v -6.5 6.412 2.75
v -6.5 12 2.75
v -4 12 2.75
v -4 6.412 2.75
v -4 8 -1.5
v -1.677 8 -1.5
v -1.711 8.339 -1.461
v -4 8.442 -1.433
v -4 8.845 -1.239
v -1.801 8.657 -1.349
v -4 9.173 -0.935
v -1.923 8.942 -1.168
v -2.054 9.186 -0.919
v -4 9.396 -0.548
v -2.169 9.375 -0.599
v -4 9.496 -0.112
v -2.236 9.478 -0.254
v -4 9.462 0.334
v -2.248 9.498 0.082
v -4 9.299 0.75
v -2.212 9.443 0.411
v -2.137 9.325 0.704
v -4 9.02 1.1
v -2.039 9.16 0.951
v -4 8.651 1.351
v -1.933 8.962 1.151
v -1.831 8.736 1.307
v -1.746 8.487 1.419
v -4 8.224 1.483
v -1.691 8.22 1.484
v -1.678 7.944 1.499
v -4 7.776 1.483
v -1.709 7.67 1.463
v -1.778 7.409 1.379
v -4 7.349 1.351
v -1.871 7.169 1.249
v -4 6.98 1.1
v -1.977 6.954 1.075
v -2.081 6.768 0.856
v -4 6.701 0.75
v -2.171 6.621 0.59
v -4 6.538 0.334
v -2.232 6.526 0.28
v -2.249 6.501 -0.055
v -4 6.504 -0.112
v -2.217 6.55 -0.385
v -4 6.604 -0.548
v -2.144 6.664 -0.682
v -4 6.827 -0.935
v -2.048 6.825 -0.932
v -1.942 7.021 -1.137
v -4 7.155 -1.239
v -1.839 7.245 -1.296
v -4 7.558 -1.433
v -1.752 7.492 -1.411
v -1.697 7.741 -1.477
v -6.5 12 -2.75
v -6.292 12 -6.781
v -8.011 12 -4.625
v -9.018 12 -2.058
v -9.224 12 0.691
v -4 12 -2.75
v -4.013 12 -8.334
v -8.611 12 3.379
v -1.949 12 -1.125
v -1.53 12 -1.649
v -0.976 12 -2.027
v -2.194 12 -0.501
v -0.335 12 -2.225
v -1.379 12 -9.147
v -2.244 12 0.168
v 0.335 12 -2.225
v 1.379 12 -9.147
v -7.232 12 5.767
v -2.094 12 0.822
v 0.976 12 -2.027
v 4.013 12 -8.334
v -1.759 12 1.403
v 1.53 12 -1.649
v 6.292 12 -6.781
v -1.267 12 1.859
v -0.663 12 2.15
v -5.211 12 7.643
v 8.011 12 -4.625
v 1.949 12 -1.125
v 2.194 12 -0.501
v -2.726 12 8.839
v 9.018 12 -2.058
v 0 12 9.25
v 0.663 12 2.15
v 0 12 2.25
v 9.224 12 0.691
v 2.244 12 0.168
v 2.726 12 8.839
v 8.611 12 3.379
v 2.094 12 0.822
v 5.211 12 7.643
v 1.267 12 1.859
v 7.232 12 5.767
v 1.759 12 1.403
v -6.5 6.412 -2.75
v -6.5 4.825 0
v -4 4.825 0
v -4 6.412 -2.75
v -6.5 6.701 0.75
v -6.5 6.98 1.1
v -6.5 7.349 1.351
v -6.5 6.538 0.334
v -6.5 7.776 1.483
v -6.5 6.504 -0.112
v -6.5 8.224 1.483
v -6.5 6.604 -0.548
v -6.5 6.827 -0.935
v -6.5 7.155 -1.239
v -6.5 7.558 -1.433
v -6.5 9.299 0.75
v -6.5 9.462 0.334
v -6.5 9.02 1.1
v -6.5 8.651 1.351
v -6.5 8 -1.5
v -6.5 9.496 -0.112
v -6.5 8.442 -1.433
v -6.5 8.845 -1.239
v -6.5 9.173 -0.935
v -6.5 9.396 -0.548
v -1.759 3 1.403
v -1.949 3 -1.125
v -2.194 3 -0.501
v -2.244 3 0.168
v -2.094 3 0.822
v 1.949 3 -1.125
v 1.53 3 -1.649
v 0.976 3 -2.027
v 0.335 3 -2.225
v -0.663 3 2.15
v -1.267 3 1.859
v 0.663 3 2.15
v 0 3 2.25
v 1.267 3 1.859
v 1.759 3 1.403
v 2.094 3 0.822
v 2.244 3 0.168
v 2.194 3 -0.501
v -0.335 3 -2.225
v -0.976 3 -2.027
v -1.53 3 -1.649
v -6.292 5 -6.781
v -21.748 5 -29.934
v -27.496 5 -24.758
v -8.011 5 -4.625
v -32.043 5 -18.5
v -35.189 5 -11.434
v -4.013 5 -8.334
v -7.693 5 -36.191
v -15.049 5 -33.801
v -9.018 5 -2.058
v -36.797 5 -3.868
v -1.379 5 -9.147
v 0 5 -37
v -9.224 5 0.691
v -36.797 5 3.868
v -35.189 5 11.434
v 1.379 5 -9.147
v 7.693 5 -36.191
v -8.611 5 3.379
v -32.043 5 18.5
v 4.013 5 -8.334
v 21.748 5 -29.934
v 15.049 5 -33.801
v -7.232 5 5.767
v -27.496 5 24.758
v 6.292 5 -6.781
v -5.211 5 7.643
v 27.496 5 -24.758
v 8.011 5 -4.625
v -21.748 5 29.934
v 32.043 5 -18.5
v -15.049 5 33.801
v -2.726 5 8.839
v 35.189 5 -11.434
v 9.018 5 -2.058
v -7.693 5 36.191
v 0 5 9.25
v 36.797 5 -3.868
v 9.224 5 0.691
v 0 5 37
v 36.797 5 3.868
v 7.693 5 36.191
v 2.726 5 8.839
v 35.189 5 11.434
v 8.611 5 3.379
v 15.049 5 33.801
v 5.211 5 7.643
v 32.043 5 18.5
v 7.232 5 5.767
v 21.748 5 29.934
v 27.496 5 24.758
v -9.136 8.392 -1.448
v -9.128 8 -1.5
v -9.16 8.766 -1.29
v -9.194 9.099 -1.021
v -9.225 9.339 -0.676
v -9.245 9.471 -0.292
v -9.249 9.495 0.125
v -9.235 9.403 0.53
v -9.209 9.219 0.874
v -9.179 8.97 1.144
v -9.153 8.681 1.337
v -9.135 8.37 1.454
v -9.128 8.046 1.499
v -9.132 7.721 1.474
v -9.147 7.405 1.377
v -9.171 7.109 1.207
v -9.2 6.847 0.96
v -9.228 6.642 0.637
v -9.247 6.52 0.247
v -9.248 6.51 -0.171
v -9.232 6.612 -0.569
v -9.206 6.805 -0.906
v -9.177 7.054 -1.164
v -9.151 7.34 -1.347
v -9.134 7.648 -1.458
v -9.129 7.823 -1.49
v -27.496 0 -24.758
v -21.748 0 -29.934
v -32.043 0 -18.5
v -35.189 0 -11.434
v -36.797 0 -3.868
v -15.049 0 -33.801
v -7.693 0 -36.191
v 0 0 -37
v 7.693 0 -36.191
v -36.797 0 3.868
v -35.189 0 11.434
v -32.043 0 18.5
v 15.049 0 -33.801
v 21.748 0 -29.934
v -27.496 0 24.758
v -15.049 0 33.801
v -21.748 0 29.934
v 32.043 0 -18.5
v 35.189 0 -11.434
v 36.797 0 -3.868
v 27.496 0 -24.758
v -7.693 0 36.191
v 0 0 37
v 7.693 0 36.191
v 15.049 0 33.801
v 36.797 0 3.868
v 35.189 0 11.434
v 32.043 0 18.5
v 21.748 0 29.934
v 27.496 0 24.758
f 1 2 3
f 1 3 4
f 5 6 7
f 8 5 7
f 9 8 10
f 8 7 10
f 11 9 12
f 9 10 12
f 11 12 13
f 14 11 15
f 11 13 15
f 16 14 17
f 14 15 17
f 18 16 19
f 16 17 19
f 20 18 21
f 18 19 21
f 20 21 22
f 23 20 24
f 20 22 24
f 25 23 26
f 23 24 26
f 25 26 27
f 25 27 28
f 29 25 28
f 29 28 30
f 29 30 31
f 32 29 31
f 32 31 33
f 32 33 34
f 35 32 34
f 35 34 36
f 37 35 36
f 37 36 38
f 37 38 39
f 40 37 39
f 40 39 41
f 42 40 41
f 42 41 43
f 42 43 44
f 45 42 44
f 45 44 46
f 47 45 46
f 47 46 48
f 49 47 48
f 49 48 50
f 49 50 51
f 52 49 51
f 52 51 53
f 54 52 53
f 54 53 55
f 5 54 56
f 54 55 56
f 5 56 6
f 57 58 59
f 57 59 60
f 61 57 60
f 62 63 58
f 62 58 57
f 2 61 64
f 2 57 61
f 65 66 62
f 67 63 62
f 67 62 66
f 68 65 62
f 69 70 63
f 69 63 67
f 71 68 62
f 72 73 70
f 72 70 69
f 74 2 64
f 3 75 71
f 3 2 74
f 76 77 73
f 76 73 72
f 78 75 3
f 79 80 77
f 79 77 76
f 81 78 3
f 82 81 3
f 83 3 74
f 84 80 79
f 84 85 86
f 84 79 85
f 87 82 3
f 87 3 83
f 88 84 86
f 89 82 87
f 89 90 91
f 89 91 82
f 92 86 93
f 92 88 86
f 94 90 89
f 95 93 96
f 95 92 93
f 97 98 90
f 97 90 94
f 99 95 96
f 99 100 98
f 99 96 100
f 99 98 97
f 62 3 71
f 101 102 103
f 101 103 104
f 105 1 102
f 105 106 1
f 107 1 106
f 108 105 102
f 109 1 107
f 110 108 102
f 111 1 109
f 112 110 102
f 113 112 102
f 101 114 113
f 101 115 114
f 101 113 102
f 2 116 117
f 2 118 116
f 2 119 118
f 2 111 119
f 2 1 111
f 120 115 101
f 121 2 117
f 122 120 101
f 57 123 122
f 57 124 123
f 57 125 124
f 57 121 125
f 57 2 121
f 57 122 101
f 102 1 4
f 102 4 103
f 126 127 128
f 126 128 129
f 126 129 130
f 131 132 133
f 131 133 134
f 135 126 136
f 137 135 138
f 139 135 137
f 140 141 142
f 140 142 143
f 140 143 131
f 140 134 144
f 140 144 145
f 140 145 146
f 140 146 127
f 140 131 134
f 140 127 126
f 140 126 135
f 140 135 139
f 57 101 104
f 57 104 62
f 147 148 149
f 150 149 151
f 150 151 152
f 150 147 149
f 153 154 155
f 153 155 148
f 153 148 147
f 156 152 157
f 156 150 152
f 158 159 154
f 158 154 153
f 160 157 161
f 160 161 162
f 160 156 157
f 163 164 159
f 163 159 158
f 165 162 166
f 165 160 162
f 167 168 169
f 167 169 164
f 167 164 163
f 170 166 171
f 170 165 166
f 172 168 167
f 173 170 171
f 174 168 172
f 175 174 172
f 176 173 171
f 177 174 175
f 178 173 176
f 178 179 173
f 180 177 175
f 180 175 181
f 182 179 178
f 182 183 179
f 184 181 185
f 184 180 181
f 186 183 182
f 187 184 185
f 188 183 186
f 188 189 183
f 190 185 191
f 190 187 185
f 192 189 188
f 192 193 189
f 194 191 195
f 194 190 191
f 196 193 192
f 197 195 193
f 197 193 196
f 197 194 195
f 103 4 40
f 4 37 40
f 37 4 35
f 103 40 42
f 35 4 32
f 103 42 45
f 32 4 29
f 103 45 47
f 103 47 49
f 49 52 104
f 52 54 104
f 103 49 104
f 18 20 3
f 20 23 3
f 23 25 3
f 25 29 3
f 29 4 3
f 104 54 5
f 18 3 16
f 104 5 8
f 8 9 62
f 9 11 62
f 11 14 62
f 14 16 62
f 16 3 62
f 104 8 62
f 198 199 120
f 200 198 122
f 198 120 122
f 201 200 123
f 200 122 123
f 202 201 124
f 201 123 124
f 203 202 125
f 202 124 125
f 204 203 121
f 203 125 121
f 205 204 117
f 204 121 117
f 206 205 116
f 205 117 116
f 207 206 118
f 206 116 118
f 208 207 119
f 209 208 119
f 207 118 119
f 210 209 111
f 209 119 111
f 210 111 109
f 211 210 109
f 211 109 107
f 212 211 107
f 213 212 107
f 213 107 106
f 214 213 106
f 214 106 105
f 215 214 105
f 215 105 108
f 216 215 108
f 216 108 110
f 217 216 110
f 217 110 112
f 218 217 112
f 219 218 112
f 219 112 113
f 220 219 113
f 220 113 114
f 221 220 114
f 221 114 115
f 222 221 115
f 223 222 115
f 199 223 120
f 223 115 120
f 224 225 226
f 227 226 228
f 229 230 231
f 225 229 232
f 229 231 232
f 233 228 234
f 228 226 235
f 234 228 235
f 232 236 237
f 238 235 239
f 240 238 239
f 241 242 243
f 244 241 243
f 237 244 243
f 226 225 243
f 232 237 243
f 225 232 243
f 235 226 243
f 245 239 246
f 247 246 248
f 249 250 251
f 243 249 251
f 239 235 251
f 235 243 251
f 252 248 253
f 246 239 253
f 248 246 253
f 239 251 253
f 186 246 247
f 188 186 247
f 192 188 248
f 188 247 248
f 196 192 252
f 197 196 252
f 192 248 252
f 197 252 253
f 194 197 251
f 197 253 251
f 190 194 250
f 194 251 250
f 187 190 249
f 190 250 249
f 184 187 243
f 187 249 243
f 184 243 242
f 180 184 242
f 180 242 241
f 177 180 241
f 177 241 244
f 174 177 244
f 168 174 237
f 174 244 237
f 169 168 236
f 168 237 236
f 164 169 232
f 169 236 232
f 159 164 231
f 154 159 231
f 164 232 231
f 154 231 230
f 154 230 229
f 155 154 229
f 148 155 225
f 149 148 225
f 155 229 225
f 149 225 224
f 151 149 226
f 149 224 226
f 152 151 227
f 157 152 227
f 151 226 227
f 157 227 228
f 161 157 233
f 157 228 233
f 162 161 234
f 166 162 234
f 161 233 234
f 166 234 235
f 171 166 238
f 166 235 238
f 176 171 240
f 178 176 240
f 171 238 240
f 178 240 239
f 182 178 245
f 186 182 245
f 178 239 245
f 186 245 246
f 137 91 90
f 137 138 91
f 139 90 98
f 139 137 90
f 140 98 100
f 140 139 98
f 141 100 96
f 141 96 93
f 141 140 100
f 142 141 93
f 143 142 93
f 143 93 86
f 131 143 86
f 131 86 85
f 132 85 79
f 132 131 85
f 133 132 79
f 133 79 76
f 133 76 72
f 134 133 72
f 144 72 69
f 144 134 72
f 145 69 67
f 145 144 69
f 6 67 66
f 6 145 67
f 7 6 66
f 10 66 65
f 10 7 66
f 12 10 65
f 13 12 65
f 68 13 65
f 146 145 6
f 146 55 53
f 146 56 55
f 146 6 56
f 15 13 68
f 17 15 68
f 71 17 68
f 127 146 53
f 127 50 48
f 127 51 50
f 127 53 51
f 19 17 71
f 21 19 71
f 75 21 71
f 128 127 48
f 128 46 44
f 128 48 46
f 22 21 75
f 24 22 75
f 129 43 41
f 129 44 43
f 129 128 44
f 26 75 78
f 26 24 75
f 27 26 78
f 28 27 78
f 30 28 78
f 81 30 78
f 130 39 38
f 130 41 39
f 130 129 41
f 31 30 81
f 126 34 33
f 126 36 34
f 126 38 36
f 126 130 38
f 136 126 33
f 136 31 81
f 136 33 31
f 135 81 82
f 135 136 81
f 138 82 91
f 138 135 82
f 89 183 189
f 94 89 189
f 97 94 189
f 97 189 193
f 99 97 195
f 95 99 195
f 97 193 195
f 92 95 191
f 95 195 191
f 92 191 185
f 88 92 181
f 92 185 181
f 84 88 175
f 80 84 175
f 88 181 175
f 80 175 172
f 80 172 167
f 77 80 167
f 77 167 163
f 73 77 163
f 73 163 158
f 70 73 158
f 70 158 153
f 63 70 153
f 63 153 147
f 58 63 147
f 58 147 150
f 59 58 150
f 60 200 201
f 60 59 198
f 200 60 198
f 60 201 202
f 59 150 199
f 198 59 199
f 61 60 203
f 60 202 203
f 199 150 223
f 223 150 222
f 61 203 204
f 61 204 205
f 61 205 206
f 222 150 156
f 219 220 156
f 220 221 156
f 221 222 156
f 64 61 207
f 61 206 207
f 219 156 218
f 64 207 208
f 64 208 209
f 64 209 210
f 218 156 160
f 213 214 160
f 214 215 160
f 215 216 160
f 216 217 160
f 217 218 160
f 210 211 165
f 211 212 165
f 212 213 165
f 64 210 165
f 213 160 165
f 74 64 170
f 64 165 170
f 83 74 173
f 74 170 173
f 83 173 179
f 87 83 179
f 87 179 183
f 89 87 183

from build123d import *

# Parameters (mm, degrees)
SKETCH1_R                 = 37
BOSS_EXTRUDE1_DEPTH       = 5
SKETCH2_R                 = 9.25
SKETCH2_R_2               = 2.25
BOSS_EXTRUDE2_DEPTH       = 7
F_1_0MM_DOWEL_HOLE1_D     = 3
F_1_0MM_DOWEL_HOLE1_DEPTH = 8
CUT_EXTRUDE1_START        = -2
SKETCH5_R                 = 2.25
CUT_EXTRUDE1_DEPTH        = 2
CUT_EXTRUDE2_DEPTH        = 2.5


with BuildPart() as part:
    # Sketch1 → Boss-Extrude1 (new body)
    with BuildSketch(Plane(origin=(0, 0, 0), x_dir=(1, 0, 0), z_dir=(0, 1, 0))):
        with Locations(Location((0, 0, 0), (0, 0, 270))):
            Circle(SKETCH1_R)
    extrude(amount=BOSS_EXTRUDE1_DEPTH)

    # Sketch2 → Boss-Extrude2 (add)
    with BuildSketch(Plane(origin=(0, 5, 0), x_dir=(1, 0, 0), z_dir=(0, 1, 0))):
        with Locations(Location((0, 0, 0), (0, 0, 270))):
            Circle(SKETCH2_R)
        with Locations(Location((0, 0, 0), (0, 0, 270))):
            Circle(SKETCH2_R_2, mode=Mode.SUBTRACT)
    extrude(amount=BOSS_EXTRUDE2_DEPTH)

    # Ø1.0mm Dowel Hole1
    with Locations(Plane.ZY.offset(9.25)):
        with Locations((0, 8)):
            Hole(F_1_0MM_DOWEL_HOLE1_D / 2, depth=F_1_0MM_DOWEL_HOLE1_DEPTH)

    # Sketch5 → Cut-Extrude1 (cut)
    with BuildSketch(Plane(origin=(0, 5, 0), x_dir=(1, 0, 0), z_dir=(0, 1, 0)).offset(CUT_EXTRUDE1_START)):
        with Locations(Location((0, 0, 0), (0, 0, 270))):
            Circle(SKETCH5_R)
    extrude(amount=CUT_EXTRUDE1_DEPTH, mode=Mode.SUBTRACT)

    # Sketch6 → Cut-Extrude2 (cut)
    with BuildSketch(Plane(origin=(-6.5, 0, 0), x_dir=(0, 0, -1), z_dir=(1, 0, 0))):
        Polygon((-2.75, 12), (-2.75, 6.41228676), (0, 4.824573519), (2.75, 6.41228676), (2.75, 12), align=None)
    extrude(amount=CUT_EXTRUDE2_DEPTH, mode=Mode.SUBTRACT)


solid = part.part
